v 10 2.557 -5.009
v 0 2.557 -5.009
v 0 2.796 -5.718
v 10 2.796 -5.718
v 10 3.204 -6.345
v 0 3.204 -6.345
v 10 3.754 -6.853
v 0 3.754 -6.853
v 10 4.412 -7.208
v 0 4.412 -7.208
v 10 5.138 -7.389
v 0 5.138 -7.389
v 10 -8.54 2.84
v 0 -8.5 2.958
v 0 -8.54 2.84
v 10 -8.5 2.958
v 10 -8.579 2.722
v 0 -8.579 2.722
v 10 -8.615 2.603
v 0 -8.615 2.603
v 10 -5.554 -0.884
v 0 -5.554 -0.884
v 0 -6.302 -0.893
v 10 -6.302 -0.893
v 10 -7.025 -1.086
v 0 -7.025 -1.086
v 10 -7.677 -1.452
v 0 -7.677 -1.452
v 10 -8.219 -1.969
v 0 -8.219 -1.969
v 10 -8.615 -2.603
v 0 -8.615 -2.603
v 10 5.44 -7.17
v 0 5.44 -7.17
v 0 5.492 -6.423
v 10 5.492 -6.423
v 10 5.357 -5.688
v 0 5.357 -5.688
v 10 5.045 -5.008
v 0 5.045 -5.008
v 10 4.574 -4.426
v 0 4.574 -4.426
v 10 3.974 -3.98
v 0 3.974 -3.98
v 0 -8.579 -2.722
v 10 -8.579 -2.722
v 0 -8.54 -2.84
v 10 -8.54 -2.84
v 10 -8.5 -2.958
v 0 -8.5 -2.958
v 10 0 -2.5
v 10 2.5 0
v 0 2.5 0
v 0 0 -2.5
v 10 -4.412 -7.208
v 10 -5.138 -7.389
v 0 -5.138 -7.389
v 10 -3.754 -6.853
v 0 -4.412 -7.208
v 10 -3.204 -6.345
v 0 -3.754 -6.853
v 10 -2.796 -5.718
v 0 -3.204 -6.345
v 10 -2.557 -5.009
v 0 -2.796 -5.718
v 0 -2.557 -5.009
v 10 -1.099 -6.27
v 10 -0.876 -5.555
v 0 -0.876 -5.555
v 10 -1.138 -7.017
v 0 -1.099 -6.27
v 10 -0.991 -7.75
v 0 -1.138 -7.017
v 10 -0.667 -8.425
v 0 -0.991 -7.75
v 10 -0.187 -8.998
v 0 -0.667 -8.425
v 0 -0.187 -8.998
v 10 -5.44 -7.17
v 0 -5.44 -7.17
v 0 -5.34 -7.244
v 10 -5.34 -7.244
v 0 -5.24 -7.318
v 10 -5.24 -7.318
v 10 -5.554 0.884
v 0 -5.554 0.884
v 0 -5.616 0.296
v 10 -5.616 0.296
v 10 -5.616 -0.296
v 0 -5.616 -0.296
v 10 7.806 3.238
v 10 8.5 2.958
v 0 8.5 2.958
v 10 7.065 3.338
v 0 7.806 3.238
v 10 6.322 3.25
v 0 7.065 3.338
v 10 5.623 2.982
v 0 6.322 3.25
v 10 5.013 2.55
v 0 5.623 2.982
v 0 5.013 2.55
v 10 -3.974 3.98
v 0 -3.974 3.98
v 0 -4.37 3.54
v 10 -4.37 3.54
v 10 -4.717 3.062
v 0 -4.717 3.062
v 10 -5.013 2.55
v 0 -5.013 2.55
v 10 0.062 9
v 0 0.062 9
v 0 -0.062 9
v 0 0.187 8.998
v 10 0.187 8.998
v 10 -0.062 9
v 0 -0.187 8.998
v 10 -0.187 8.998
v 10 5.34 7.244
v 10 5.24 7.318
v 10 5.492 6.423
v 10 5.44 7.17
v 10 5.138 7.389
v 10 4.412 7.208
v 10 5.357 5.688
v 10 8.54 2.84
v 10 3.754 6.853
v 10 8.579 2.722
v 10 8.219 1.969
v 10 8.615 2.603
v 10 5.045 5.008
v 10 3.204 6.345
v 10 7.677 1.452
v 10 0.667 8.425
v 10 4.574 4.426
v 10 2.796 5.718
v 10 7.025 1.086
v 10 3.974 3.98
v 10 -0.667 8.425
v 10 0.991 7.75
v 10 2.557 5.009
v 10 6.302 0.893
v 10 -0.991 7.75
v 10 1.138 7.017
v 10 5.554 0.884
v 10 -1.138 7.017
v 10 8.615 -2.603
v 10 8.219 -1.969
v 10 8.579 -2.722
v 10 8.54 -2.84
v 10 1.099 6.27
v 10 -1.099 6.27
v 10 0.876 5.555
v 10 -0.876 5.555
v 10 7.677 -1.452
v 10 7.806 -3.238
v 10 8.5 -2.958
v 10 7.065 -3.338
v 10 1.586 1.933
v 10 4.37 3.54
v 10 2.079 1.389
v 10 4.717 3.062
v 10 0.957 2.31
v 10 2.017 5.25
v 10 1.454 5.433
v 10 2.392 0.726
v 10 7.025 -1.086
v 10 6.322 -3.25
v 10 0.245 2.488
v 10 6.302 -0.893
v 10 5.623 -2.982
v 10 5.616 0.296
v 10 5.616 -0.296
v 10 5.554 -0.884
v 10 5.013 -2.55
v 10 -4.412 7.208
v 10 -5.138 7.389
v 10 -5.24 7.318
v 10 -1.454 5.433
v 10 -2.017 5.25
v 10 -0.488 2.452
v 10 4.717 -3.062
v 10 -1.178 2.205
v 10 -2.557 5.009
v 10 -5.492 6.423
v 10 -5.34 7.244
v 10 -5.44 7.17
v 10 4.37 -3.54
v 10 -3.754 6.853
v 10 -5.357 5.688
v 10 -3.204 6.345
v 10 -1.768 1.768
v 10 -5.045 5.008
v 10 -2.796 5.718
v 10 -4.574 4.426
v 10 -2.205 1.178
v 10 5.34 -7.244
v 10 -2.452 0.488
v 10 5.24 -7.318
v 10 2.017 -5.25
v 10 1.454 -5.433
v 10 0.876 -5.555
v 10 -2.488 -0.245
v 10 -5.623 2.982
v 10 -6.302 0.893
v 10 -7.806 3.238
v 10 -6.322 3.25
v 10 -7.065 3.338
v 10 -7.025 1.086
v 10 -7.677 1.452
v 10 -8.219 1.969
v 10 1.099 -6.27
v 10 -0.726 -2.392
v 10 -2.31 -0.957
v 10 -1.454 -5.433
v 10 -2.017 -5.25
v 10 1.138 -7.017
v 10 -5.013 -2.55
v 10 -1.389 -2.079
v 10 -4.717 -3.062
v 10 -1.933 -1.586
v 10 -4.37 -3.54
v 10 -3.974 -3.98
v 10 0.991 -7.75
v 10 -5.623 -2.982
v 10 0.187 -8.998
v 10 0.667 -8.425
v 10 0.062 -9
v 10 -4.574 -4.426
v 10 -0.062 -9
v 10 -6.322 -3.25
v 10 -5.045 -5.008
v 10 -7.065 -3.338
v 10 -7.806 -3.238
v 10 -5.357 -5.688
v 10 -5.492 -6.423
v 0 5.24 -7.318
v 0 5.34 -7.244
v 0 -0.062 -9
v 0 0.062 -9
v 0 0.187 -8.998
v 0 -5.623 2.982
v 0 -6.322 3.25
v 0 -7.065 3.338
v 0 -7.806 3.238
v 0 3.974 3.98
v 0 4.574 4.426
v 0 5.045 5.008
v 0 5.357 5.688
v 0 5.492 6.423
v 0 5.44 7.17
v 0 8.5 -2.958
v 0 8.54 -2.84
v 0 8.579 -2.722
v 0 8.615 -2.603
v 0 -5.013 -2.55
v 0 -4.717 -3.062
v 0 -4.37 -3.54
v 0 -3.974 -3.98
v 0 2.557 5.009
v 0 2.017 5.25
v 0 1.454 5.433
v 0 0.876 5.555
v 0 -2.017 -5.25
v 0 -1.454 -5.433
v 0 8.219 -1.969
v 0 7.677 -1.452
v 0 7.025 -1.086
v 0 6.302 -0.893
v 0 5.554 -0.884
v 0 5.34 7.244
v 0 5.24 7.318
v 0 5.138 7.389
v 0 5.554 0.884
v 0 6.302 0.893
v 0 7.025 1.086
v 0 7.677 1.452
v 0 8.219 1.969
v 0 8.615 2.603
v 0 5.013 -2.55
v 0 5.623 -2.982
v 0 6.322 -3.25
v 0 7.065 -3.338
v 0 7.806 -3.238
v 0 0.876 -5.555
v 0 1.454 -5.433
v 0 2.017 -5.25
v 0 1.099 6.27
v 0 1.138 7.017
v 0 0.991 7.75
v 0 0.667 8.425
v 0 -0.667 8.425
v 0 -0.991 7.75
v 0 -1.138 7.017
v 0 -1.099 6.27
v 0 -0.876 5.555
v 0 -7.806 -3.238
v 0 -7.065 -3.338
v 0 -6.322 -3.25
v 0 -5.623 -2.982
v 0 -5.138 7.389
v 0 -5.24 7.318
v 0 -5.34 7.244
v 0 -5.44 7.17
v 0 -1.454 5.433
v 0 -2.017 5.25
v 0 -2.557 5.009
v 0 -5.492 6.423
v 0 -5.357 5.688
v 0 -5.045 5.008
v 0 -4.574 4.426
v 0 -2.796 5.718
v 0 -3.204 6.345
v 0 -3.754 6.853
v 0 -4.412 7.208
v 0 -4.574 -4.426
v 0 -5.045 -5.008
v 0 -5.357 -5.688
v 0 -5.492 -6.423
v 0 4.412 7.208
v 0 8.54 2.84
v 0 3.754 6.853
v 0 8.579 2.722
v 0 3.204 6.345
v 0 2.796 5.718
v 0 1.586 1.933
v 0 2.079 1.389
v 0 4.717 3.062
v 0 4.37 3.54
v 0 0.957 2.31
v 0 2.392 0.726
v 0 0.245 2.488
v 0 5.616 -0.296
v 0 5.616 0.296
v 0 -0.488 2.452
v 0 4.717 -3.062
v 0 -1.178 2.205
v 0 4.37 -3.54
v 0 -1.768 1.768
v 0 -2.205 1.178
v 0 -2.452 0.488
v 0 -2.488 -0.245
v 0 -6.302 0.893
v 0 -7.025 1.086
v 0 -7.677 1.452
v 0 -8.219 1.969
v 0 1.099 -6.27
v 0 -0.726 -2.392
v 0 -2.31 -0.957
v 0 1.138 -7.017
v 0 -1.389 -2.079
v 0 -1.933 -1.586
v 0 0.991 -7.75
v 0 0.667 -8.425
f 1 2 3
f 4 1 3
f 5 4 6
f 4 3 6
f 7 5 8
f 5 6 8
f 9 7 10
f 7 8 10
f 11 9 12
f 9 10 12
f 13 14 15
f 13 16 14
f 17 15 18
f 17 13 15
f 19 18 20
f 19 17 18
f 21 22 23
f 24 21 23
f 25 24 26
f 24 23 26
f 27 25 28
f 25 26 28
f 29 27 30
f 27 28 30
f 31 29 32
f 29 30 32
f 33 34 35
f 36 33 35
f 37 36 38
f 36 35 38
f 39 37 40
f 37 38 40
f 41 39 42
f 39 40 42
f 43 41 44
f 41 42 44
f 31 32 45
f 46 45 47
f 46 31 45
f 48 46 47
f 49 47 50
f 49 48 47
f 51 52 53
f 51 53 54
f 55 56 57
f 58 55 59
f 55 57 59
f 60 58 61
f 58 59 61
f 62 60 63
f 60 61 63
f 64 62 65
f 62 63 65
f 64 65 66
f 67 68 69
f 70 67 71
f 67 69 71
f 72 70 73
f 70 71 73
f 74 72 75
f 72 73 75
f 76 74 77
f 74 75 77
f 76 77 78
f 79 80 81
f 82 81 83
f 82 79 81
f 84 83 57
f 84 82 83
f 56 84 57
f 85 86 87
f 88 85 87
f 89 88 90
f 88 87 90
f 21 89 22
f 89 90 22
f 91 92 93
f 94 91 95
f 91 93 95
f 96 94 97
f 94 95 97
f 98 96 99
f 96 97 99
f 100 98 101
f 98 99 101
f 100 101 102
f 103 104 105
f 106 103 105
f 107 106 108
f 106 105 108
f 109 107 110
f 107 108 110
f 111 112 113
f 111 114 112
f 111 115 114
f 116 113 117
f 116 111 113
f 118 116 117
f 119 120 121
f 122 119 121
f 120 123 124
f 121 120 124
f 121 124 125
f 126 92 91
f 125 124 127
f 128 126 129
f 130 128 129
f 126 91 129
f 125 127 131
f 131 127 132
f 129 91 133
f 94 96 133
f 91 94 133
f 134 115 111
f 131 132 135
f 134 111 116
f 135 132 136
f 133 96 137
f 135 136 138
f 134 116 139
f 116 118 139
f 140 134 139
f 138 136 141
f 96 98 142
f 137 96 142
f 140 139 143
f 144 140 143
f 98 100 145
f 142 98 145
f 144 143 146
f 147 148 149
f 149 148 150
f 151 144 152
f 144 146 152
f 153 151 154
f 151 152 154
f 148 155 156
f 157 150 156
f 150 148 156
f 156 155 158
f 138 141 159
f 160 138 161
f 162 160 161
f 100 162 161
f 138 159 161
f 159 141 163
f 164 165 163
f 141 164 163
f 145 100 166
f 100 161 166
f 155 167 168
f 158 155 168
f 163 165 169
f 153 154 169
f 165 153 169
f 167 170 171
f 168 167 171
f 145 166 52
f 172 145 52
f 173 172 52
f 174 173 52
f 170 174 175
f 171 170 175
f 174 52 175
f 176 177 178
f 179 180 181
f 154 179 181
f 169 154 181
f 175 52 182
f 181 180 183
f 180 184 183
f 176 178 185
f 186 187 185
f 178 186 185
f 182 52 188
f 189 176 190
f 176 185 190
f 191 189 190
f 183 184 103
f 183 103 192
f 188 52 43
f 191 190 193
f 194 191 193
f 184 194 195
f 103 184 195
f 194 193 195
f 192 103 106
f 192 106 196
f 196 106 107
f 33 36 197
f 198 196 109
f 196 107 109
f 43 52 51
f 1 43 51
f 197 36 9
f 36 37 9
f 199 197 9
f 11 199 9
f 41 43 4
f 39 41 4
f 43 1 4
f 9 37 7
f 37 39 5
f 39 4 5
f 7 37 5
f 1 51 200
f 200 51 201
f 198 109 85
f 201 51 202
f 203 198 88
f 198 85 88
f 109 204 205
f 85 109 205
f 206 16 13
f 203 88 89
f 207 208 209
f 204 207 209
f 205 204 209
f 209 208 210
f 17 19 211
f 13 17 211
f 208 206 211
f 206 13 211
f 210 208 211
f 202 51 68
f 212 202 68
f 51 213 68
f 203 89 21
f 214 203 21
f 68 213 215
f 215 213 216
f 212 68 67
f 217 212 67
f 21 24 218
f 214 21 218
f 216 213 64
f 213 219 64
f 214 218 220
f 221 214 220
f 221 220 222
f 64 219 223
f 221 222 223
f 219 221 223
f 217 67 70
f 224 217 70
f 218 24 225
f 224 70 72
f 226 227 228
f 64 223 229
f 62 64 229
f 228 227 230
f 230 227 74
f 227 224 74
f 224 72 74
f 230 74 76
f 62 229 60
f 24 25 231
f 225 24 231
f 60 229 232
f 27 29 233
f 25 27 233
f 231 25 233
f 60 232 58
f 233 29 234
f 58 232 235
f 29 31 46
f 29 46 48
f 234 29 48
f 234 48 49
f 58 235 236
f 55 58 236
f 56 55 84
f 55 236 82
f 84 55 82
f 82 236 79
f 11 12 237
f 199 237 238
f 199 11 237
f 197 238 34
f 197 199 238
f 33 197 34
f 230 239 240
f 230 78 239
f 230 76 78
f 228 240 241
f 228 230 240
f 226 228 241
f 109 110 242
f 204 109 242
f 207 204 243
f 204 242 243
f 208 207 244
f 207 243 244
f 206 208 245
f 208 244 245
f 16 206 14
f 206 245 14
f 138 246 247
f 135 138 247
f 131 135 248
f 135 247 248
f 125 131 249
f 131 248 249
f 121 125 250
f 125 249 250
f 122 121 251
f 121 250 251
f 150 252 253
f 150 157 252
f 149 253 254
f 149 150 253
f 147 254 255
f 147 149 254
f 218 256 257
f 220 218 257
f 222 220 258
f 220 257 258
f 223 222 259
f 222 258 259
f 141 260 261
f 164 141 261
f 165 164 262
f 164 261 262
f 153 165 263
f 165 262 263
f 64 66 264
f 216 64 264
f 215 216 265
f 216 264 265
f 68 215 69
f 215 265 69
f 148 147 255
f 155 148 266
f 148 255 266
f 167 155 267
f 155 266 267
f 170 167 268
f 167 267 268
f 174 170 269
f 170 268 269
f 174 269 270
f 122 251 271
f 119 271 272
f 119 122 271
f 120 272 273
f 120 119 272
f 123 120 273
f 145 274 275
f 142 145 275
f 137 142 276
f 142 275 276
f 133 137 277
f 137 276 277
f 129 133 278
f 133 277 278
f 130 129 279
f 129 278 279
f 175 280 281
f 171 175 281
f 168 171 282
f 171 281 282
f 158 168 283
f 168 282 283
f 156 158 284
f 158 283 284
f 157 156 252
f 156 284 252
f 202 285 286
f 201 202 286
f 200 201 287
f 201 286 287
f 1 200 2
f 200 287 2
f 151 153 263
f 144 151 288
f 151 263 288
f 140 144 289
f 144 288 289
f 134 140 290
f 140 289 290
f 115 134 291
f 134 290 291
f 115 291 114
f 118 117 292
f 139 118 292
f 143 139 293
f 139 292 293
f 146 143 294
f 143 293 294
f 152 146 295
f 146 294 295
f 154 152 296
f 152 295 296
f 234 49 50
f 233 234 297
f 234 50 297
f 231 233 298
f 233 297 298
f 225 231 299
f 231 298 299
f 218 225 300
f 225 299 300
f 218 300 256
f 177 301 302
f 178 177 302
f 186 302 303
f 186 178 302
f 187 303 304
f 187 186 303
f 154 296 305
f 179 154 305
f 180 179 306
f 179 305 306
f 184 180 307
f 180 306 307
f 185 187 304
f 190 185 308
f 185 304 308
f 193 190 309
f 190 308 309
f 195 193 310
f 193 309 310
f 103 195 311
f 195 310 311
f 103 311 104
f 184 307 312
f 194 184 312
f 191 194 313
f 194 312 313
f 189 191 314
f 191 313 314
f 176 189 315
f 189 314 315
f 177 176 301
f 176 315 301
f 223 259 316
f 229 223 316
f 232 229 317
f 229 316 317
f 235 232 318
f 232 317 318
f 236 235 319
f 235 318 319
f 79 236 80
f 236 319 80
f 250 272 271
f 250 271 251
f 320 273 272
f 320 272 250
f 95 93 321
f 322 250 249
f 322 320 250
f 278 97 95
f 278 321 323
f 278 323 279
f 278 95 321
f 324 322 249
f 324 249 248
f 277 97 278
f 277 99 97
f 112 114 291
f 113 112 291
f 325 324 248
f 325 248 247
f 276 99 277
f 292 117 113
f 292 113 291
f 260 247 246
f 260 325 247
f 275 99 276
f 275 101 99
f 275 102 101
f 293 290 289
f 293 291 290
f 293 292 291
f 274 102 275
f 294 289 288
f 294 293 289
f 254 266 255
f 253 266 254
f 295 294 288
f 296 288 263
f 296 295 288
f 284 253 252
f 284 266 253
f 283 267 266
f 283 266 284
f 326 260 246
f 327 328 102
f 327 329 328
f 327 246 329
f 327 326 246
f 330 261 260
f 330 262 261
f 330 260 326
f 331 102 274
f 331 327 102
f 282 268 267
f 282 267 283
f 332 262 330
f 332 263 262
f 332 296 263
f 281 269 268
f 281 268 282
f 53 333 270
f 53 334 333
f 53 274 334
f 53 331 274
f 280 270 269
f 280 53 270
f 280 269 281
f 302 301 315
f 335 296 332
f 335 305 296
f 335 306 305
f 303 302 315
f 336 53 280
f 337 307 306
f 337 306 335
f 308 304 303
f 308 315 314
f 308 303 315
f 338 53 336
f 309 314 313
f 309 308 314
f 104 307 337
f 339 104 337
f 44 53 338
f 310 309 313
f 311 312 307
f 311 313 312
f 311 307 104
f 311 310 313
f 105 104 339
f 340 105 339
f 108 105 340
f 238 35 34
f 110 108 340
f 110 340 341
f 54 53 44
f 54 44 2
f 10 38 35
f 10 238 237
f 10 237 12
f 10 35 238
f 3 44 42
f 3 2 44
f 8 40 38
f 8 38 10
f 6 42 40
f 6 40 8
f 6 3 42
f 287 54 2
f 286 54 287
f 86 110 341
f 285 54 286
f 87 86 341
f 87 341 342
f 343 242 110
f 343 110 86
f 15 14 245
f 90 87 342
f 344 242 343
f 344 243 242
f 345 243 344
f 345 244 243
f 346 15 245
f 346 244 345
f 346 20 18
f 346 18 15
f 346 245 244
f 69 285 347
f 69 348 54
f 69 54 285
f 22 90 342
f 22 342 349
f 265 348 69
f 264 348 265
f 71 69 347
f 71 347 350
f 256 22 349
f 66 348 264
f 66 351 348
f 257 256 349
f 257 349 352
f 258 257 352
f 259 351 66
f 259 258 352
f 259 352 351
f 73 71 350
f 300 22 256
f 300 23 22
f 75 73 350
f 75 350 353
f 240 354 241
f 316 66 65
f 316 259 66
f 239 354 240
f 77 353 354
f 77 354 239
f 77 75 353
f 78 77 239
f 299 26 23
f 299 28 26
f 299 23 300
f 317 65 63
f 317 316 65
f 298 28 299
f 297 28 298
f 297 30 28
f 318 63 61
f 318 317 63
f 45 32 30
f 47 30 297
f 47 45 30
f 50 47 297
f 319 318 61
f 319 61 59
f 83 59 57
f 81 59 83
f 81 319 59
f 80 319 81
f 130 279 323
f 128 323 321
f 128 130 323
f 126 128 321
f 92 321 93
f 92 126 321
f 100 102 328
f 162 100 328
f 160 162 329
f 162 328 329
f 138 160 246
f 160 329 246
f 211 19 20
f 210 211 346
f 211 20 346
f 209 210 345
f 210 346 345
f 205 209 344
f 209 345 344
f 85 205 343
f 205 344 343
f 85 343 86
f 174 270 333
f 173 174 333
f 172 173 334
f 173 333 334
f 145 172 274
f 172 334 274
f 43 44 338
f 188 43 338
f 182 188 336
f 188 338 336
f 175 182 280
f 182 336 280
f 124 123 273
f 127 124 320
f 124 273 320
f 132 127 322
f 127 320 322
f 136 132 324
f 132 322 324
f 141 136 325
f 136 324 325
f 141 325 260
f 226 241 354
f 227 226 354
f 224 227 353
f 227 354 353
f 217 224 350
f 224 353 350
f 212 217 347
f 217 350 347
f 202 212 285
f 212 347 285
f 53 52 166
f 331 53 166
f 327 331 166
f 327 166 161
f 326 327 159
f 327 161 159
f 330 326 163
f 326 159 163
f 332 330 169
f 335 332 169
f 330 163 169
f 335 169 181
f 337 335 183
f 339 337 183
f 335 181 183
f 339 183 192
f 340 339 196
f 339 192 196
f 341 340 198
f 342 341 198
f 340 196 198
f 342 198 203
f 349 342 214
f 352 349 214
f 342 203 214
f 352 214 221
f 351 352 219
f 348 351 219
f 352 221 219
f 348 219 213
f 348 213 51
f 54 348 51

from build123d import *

# Parameters (mm, degrees)
BASPROSKE_W         = 10
BASPROSKE_H         = 9
TOOTHCUT_DEPTH      = 17.186414056
TEETHCUTS_COUNT     = 10
TEETHCUTS_ANGLE     = 324
BORSKE_R            = 2.5
BORE_DEPTH          = 50.0000508
BOSS_EXTRUDE1_DEPTH = 10


with BuildPart() as part:
    # BasProSke → Base-Revolve (revolve)
    with BuildSketch(Plane(origin=(0, 0, 0), x_dir=(1, 0, 0), z_dir=(0, 1, 0)), mode=Mode.PRIVATE) as base_revolve_sk:
        with Locations((5, 4.5)):
            Rectangle(BASPROSKE_W, BASPROSKE_H)
    revolve(base_revolve_sk.sketch.rotate(Axis((-10, 0, 0), (1, 0, 0)), 180), axis=Axis((-10, 0, 0), (1, 0, 0)))

    # TooCutSke → ToothCut (cut, through all)
    with BuildSketch(Plane(origin=(0, 0, 0), x_dir=(0, 0, -1), z_dir=(1, 0, 0))):
        with BuildLine():
            ThreePointArc((0.883878355, 5.554109745), (0, 5.624), (-0.883878355, 5.554109745))
            ThreePointArc((-0.883878355, 5.554109745), (-1.258245767, 7.379188248), (-2.637816971, 8.631324741))
            ThreePointArc((-2.637816971, 8.631324741), (0, 9.0254), (2.637816971, 8.631324741))
            ThreePointArc((2.637816971, 8.631324741), (1.258245767, 7.379188248), (0.883878355, 5.554109745))
        make_face()
    toothcut = extrude(amount=TOOTHCUT_DEPTH, mode=Mode.SUBTRACT)

    # TeethCuts: ToothCut ×10 about axis
    teethcuts_axis = Axis((-10, 0, 0), (1, 0, 0))
    for i in range(1, TEETHCUTS_COUNT):
        add(toothcut.rotate(teethcuts_axis, i * TEETHCUTS_ANGLE / (TEETHCUTS_COUNT - 1)), mode=Mode.SUBTRACT)

    # BorSke → Bore (cut, symmetric)
    with BuildSketch(Plane(origin=(0, 0, 0), x_dir=(0, 0, -1), z_dir=(1, 0, 0))):
        with Locations(Location((0, 0, 0), (0, 0, 180))):
            Circle(BORSKE_R)
    extrude(amount=BORE_DEPTH, both=True, mode=Mode.SUBTRACT)

    # Sketch1 → Boss-Extrude1 (add, through all)
    with BuildSketch(Plane(origin=(10, 0, 0), x_dir=(0, 0, -1), z_dir=(1, 0, 0))):
        with BuildLine():
            Line((0, 2.5), (2.5, 0))
            ThreePointArc((2.5, 0), (1.767766953, 1.767766953), (0, 2.5))
        make_face()
    extrude(amount=-BOSS_EXTRUDE1_DEPTH)


solid = part.part
